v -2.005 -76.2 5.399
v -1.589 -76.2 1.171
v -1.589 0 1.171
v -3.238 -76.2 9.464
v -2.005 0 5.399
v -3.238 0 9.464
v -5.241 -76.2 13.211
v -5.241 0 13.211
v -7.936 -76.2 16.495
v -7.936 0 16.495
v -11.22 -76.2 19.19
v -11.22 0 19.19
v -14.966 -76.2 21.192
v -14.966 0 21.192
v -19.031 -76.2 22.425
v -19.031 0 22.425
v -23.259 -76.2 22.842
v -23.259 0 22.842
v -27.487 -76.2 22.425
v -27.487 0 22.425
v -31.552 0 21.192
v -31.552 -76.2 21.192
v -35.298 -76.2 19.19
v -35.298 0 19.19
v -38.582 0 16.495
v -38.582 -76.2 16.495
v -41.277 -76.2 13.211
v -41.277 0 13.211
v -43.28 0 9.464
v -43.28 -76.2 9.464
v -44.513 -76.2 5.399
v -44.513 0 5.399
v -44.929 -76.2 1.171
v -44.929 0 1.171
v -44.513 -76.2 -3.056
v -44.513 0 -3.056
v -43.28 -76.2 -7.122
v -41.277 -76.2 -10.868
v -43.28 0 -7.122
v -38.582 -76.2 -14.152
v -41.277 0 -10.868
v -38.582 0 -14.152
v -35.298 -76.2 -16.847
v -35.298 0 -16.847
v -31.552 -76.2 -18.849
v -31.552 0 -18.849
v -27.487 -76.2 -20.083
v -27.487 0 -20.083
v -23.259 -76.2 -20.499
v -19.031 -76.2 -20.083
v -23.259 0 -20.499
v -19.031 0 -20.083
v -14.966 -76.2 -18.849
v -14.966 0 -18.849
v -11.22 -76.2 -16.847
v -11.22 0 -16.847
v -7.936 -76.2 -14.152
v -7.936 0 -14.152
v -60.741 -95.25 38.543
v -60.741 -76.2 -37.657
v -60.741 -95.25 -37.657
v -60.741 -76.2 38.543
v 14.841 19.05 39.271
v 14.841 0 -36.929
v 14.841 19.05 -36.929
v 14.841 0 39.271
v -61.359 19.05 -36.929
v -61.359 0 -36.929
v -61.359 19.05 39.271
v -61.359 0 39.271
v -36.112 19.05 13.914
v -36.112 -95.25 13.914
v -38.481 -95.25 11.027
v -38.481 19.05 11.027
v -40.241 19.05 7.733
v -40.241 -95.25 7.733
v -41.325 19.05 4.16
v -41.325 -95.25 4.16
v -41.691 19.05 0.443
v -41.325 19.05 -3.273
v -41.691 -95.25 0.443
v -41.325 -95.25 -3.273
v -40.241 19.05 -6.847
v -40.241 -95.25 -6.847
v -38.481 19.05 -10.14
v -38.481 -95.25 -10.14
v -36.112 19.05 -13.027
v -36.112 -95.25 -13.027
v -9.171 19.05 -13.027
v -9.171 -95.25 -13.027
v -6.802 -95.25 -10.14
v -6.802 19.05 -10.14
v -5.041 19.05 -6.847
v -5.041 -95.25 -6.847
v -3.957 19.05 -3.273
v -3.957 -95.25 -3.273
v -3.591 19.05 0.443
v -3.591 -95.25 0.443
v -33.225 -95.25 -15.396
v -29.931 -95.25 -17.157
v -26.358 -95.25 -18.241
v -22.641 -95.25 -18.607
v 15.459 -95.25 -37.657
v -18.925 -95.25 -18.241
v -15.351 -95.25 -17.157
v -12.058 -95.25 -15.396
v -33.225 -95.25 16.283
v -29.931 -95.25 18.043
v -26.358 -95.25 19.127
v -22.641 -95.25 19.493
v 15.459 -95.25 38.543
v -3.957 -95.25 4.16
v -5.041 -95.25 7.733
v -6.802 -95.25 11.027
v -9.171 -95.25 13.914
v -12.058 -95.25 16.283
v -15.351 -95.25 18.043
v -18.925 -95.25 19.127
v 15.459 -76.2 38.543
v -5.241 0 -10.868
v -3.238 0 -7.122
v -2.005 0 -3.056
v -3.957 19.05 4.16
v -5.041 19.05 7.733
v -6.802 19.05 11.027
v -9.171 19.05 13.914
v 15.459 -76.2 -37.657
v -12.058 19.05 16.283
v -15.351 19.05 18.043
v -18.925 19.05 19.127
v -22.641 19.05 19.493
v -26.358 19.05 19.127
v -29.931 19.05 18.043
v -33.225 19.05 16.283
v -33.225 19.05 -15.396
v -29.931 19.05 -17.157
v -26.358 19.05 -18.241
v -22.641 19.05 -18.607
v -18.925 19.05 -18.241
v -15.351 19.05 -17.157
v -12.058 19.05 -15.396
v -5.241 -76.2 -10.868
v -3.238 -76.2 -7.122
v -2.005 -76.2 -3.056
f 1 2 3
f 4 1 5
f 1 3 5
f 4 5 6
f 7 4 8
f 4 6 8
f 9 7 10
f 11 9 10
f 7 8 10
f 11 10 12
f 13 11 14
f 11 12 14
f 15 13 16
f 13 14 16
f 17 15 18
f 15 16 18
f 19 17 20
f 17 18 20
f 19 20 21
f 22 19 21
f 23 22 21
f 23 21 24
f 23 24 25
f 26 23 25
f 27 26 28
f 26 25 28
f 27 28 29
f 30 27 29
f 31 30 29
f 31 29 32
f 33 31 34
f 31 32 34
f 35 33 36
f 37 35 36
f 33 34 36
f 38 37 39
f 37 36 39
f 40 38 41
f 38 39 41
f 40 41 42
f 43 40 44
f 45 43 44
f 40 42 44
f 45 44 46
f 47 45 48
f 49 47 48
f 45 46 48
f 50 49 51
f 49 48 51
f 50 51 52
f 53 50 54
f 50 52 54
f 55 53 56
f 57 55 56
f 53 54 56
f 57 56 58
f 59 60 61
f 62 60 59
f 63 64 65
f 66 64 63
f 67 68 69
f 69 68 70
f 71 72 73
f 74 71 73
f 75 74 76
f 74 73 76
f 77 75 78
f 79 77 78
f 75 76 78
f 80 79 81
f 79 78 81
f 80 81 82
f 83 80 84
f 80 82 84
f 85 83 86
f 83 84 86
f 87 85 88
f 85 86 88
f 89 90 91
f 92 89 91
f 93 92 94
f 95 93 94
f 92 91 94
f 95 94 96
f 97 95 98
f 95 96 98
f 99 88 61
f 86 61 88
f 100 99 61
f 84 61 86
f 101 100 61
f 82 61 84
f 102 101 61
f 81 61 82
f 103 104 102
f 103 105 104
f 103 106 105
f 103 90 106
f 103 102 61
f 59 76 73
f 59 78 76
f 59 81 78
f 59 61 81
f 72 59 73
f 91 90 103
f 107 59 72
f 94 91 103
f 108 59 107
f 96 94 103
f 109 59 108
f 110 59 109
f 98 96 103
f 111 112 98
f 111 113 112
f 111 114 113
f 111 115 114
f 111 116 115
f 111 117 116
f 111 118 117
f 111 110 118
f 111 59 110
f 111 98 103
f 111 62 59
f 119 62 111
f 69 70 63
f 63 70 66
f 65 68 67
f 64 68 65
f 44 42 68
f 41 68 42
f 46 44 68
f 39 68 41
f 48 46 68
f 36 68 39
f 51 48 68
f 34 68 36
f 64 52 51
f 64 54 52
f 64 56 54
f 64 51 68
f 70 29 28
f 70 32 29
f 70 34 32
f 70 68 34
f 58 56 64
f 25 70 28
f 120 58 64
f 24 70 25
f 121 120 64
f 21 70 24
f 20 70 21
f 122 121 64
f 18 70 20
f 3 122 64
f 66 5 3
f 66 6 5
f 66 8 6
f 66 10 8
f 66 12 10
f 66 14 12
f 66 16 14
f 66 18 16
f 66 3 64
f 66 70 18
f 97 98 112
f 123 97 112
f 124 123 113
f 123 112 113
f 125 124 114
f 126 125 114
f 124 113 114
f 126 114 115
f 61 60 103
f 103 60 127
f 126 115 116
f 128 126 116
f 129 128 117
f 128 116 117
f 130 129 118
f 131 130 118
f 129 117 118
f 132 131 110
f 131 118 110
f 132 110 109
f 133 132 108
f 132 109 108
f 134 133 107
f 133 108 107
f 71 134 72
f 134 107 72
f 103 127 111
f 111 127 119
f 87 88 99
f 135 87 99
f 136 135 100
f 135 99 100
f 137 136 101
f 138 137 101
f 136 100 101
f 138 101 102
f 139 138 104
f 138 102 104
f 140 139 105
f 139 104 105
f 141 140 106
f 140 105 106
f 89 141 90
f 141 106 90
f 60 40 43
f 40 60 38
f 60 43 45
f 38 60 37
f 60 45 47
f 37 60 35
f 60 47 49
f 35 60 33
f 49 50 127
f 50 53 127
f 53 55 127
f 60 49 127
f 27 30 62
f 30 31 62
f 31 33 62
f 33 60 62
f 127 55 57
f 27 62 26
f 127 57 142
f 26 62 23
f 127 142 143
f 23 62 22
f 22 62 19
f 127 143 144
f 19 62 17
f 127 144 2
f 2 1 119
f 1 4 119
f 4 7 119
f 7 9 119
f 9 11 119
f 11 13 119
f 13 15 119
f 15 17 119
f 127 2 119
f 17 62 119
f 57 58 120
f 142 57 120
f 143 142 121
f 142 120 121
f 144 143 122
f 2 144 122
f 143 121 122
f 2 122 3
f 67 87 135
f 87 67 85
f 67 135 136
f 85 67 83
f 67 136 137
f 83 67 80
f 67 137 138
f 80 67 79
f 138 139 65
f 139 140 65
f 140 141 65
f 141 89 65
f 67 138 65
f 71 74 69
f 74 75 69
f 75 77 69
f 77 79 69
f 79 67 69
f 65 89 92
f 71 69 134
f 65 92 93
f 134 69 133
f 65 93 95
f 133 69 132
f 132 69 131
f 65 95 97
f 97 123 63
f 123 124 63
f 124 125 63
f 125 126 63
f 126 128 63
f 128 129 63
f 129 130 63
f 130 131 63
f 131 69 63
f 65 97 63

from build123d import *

# Parameters (mm, degrees)
F0_W     = 76.2
F0_H     = 76.2
F1_DEPTH = 19.05
F3_DEPTH = 76.2
F4_W     = 76.2
F4_H     = 76.2
F4_R     = 21.6703506802
F5_DEPTH = 19.05
F7_DEPTH = 114.301


with BuildPart() as f1:
    # F0 (on Front) → F1 (new body)
    with BuildSketch(Plane.XZ):
        with Locations((-23.25902578, 1.1713085696)):
            Rectangle(F0_W, F0_H)
    extrude(amount=-F1_DEPTH)

    # F2 (on face) → F3 (join)
    with BuildSketch(Plane.XZ):
        with BuildLine():
            Line((-38.5822776966, 16.4945604863), (-7.9357738633, -14.1519433471))
            ThreePointArc((-7.9357738633, -14.1519433471), (-3.2382323242, -7.1215756093), (-1.5886750997, 1.1713085696))
            ThreePointArc((-1.5886750997, 1.1713085696), (-14.9661416011, 21.1921020254), (-38.5822776966, 16.4945604863))
        make_face()
        with BuildLine():
            ThreePointArc((-38.5822776966, 16.4945604863), (-38.5822776966, -14.1519433471), (-7.9357738633, -14.1519433471))
            Line((-7.9357738633, -14.1519433471), (-38.5822776966, 16.4945604863))
        make_face()
    extrude(amount=F3_DEPTH)

    # F4 (on face) → F5 (join)
    with BuildSketch(Plane.XZ.offset(76.2)):
        with Locations((-22.6412163979, 0.4432164133)):
            Rectangle(F4_W, F4_H)
        with Locations((-23.25902578, 1.1713085696)):
            Circle(F4_R)
    extrude(amount=F5_DEPTH)

    # F6 (on face) → F7 (cut, through all)
    with BuildSketch(Plane.XZ.offset(95.25)):
        with BuildLine():
            ThreePointArc((-3.5912163979, 0.4432164133), (-5.0413113036, 7.7333357998), (-9.1708322163, 13.9136005949))
            Line((-9.1708322163, 13.9136005949), (-22.6412163979, 0.4432164133))
            Line((-22.6412163979, 0.4432164133), (-9.1708322163, -13.0271677683))
            ThreePointArc((-9.1708322163, -13.0271677683), (-5.0413113036, -6.8469029733), (-3.5912163979, 0.4432164133))
        make_face()
        with BuildLine():
            Line((-22.6412163979, 0.4432164133), (-9.1708322163, 13.9136005949))
            ThreePointArc((-9.1708322163, 13.9136005949), (-22.6412163979, 19.4932164133), (-36.1116005795, 13.9136005949))
            Line((-36.1116005795, 13.9136005949), (-22.6412163979, 0.4432164133))
        make_face()
        with BuildLine():
            Line((-9.1708322163, -13.0271677683), (-22.6412163979, 0.4432164133))
            Line((-22.6412163979, 0.4432164133), (-36.1116005795, -13.0271677683))
            ThreePointArc((-36.1116005795, -13.0271677683), (-22.6412163979, -18.6067835867), (-9.1708322163, -13.0271677683))
        make_face()
        with BuildLine():
            Line((-36.1116005795, -13.0271677683), (-22.6412163979, 0.4432164133))
            Line((-22.6412163979, 0.4432164133), (-36.1116005795, 13.9136005949))
            ThreePointArc((-36.1116005795, 13.9136005949), (-41.6912163979, 0.4432164133), (-36.1116005795, -13.0271677683))
        make_face()
    extrude(amount=-F7_DEPTH, mode=Mode.SUBTRACT)


solid = f1.part
